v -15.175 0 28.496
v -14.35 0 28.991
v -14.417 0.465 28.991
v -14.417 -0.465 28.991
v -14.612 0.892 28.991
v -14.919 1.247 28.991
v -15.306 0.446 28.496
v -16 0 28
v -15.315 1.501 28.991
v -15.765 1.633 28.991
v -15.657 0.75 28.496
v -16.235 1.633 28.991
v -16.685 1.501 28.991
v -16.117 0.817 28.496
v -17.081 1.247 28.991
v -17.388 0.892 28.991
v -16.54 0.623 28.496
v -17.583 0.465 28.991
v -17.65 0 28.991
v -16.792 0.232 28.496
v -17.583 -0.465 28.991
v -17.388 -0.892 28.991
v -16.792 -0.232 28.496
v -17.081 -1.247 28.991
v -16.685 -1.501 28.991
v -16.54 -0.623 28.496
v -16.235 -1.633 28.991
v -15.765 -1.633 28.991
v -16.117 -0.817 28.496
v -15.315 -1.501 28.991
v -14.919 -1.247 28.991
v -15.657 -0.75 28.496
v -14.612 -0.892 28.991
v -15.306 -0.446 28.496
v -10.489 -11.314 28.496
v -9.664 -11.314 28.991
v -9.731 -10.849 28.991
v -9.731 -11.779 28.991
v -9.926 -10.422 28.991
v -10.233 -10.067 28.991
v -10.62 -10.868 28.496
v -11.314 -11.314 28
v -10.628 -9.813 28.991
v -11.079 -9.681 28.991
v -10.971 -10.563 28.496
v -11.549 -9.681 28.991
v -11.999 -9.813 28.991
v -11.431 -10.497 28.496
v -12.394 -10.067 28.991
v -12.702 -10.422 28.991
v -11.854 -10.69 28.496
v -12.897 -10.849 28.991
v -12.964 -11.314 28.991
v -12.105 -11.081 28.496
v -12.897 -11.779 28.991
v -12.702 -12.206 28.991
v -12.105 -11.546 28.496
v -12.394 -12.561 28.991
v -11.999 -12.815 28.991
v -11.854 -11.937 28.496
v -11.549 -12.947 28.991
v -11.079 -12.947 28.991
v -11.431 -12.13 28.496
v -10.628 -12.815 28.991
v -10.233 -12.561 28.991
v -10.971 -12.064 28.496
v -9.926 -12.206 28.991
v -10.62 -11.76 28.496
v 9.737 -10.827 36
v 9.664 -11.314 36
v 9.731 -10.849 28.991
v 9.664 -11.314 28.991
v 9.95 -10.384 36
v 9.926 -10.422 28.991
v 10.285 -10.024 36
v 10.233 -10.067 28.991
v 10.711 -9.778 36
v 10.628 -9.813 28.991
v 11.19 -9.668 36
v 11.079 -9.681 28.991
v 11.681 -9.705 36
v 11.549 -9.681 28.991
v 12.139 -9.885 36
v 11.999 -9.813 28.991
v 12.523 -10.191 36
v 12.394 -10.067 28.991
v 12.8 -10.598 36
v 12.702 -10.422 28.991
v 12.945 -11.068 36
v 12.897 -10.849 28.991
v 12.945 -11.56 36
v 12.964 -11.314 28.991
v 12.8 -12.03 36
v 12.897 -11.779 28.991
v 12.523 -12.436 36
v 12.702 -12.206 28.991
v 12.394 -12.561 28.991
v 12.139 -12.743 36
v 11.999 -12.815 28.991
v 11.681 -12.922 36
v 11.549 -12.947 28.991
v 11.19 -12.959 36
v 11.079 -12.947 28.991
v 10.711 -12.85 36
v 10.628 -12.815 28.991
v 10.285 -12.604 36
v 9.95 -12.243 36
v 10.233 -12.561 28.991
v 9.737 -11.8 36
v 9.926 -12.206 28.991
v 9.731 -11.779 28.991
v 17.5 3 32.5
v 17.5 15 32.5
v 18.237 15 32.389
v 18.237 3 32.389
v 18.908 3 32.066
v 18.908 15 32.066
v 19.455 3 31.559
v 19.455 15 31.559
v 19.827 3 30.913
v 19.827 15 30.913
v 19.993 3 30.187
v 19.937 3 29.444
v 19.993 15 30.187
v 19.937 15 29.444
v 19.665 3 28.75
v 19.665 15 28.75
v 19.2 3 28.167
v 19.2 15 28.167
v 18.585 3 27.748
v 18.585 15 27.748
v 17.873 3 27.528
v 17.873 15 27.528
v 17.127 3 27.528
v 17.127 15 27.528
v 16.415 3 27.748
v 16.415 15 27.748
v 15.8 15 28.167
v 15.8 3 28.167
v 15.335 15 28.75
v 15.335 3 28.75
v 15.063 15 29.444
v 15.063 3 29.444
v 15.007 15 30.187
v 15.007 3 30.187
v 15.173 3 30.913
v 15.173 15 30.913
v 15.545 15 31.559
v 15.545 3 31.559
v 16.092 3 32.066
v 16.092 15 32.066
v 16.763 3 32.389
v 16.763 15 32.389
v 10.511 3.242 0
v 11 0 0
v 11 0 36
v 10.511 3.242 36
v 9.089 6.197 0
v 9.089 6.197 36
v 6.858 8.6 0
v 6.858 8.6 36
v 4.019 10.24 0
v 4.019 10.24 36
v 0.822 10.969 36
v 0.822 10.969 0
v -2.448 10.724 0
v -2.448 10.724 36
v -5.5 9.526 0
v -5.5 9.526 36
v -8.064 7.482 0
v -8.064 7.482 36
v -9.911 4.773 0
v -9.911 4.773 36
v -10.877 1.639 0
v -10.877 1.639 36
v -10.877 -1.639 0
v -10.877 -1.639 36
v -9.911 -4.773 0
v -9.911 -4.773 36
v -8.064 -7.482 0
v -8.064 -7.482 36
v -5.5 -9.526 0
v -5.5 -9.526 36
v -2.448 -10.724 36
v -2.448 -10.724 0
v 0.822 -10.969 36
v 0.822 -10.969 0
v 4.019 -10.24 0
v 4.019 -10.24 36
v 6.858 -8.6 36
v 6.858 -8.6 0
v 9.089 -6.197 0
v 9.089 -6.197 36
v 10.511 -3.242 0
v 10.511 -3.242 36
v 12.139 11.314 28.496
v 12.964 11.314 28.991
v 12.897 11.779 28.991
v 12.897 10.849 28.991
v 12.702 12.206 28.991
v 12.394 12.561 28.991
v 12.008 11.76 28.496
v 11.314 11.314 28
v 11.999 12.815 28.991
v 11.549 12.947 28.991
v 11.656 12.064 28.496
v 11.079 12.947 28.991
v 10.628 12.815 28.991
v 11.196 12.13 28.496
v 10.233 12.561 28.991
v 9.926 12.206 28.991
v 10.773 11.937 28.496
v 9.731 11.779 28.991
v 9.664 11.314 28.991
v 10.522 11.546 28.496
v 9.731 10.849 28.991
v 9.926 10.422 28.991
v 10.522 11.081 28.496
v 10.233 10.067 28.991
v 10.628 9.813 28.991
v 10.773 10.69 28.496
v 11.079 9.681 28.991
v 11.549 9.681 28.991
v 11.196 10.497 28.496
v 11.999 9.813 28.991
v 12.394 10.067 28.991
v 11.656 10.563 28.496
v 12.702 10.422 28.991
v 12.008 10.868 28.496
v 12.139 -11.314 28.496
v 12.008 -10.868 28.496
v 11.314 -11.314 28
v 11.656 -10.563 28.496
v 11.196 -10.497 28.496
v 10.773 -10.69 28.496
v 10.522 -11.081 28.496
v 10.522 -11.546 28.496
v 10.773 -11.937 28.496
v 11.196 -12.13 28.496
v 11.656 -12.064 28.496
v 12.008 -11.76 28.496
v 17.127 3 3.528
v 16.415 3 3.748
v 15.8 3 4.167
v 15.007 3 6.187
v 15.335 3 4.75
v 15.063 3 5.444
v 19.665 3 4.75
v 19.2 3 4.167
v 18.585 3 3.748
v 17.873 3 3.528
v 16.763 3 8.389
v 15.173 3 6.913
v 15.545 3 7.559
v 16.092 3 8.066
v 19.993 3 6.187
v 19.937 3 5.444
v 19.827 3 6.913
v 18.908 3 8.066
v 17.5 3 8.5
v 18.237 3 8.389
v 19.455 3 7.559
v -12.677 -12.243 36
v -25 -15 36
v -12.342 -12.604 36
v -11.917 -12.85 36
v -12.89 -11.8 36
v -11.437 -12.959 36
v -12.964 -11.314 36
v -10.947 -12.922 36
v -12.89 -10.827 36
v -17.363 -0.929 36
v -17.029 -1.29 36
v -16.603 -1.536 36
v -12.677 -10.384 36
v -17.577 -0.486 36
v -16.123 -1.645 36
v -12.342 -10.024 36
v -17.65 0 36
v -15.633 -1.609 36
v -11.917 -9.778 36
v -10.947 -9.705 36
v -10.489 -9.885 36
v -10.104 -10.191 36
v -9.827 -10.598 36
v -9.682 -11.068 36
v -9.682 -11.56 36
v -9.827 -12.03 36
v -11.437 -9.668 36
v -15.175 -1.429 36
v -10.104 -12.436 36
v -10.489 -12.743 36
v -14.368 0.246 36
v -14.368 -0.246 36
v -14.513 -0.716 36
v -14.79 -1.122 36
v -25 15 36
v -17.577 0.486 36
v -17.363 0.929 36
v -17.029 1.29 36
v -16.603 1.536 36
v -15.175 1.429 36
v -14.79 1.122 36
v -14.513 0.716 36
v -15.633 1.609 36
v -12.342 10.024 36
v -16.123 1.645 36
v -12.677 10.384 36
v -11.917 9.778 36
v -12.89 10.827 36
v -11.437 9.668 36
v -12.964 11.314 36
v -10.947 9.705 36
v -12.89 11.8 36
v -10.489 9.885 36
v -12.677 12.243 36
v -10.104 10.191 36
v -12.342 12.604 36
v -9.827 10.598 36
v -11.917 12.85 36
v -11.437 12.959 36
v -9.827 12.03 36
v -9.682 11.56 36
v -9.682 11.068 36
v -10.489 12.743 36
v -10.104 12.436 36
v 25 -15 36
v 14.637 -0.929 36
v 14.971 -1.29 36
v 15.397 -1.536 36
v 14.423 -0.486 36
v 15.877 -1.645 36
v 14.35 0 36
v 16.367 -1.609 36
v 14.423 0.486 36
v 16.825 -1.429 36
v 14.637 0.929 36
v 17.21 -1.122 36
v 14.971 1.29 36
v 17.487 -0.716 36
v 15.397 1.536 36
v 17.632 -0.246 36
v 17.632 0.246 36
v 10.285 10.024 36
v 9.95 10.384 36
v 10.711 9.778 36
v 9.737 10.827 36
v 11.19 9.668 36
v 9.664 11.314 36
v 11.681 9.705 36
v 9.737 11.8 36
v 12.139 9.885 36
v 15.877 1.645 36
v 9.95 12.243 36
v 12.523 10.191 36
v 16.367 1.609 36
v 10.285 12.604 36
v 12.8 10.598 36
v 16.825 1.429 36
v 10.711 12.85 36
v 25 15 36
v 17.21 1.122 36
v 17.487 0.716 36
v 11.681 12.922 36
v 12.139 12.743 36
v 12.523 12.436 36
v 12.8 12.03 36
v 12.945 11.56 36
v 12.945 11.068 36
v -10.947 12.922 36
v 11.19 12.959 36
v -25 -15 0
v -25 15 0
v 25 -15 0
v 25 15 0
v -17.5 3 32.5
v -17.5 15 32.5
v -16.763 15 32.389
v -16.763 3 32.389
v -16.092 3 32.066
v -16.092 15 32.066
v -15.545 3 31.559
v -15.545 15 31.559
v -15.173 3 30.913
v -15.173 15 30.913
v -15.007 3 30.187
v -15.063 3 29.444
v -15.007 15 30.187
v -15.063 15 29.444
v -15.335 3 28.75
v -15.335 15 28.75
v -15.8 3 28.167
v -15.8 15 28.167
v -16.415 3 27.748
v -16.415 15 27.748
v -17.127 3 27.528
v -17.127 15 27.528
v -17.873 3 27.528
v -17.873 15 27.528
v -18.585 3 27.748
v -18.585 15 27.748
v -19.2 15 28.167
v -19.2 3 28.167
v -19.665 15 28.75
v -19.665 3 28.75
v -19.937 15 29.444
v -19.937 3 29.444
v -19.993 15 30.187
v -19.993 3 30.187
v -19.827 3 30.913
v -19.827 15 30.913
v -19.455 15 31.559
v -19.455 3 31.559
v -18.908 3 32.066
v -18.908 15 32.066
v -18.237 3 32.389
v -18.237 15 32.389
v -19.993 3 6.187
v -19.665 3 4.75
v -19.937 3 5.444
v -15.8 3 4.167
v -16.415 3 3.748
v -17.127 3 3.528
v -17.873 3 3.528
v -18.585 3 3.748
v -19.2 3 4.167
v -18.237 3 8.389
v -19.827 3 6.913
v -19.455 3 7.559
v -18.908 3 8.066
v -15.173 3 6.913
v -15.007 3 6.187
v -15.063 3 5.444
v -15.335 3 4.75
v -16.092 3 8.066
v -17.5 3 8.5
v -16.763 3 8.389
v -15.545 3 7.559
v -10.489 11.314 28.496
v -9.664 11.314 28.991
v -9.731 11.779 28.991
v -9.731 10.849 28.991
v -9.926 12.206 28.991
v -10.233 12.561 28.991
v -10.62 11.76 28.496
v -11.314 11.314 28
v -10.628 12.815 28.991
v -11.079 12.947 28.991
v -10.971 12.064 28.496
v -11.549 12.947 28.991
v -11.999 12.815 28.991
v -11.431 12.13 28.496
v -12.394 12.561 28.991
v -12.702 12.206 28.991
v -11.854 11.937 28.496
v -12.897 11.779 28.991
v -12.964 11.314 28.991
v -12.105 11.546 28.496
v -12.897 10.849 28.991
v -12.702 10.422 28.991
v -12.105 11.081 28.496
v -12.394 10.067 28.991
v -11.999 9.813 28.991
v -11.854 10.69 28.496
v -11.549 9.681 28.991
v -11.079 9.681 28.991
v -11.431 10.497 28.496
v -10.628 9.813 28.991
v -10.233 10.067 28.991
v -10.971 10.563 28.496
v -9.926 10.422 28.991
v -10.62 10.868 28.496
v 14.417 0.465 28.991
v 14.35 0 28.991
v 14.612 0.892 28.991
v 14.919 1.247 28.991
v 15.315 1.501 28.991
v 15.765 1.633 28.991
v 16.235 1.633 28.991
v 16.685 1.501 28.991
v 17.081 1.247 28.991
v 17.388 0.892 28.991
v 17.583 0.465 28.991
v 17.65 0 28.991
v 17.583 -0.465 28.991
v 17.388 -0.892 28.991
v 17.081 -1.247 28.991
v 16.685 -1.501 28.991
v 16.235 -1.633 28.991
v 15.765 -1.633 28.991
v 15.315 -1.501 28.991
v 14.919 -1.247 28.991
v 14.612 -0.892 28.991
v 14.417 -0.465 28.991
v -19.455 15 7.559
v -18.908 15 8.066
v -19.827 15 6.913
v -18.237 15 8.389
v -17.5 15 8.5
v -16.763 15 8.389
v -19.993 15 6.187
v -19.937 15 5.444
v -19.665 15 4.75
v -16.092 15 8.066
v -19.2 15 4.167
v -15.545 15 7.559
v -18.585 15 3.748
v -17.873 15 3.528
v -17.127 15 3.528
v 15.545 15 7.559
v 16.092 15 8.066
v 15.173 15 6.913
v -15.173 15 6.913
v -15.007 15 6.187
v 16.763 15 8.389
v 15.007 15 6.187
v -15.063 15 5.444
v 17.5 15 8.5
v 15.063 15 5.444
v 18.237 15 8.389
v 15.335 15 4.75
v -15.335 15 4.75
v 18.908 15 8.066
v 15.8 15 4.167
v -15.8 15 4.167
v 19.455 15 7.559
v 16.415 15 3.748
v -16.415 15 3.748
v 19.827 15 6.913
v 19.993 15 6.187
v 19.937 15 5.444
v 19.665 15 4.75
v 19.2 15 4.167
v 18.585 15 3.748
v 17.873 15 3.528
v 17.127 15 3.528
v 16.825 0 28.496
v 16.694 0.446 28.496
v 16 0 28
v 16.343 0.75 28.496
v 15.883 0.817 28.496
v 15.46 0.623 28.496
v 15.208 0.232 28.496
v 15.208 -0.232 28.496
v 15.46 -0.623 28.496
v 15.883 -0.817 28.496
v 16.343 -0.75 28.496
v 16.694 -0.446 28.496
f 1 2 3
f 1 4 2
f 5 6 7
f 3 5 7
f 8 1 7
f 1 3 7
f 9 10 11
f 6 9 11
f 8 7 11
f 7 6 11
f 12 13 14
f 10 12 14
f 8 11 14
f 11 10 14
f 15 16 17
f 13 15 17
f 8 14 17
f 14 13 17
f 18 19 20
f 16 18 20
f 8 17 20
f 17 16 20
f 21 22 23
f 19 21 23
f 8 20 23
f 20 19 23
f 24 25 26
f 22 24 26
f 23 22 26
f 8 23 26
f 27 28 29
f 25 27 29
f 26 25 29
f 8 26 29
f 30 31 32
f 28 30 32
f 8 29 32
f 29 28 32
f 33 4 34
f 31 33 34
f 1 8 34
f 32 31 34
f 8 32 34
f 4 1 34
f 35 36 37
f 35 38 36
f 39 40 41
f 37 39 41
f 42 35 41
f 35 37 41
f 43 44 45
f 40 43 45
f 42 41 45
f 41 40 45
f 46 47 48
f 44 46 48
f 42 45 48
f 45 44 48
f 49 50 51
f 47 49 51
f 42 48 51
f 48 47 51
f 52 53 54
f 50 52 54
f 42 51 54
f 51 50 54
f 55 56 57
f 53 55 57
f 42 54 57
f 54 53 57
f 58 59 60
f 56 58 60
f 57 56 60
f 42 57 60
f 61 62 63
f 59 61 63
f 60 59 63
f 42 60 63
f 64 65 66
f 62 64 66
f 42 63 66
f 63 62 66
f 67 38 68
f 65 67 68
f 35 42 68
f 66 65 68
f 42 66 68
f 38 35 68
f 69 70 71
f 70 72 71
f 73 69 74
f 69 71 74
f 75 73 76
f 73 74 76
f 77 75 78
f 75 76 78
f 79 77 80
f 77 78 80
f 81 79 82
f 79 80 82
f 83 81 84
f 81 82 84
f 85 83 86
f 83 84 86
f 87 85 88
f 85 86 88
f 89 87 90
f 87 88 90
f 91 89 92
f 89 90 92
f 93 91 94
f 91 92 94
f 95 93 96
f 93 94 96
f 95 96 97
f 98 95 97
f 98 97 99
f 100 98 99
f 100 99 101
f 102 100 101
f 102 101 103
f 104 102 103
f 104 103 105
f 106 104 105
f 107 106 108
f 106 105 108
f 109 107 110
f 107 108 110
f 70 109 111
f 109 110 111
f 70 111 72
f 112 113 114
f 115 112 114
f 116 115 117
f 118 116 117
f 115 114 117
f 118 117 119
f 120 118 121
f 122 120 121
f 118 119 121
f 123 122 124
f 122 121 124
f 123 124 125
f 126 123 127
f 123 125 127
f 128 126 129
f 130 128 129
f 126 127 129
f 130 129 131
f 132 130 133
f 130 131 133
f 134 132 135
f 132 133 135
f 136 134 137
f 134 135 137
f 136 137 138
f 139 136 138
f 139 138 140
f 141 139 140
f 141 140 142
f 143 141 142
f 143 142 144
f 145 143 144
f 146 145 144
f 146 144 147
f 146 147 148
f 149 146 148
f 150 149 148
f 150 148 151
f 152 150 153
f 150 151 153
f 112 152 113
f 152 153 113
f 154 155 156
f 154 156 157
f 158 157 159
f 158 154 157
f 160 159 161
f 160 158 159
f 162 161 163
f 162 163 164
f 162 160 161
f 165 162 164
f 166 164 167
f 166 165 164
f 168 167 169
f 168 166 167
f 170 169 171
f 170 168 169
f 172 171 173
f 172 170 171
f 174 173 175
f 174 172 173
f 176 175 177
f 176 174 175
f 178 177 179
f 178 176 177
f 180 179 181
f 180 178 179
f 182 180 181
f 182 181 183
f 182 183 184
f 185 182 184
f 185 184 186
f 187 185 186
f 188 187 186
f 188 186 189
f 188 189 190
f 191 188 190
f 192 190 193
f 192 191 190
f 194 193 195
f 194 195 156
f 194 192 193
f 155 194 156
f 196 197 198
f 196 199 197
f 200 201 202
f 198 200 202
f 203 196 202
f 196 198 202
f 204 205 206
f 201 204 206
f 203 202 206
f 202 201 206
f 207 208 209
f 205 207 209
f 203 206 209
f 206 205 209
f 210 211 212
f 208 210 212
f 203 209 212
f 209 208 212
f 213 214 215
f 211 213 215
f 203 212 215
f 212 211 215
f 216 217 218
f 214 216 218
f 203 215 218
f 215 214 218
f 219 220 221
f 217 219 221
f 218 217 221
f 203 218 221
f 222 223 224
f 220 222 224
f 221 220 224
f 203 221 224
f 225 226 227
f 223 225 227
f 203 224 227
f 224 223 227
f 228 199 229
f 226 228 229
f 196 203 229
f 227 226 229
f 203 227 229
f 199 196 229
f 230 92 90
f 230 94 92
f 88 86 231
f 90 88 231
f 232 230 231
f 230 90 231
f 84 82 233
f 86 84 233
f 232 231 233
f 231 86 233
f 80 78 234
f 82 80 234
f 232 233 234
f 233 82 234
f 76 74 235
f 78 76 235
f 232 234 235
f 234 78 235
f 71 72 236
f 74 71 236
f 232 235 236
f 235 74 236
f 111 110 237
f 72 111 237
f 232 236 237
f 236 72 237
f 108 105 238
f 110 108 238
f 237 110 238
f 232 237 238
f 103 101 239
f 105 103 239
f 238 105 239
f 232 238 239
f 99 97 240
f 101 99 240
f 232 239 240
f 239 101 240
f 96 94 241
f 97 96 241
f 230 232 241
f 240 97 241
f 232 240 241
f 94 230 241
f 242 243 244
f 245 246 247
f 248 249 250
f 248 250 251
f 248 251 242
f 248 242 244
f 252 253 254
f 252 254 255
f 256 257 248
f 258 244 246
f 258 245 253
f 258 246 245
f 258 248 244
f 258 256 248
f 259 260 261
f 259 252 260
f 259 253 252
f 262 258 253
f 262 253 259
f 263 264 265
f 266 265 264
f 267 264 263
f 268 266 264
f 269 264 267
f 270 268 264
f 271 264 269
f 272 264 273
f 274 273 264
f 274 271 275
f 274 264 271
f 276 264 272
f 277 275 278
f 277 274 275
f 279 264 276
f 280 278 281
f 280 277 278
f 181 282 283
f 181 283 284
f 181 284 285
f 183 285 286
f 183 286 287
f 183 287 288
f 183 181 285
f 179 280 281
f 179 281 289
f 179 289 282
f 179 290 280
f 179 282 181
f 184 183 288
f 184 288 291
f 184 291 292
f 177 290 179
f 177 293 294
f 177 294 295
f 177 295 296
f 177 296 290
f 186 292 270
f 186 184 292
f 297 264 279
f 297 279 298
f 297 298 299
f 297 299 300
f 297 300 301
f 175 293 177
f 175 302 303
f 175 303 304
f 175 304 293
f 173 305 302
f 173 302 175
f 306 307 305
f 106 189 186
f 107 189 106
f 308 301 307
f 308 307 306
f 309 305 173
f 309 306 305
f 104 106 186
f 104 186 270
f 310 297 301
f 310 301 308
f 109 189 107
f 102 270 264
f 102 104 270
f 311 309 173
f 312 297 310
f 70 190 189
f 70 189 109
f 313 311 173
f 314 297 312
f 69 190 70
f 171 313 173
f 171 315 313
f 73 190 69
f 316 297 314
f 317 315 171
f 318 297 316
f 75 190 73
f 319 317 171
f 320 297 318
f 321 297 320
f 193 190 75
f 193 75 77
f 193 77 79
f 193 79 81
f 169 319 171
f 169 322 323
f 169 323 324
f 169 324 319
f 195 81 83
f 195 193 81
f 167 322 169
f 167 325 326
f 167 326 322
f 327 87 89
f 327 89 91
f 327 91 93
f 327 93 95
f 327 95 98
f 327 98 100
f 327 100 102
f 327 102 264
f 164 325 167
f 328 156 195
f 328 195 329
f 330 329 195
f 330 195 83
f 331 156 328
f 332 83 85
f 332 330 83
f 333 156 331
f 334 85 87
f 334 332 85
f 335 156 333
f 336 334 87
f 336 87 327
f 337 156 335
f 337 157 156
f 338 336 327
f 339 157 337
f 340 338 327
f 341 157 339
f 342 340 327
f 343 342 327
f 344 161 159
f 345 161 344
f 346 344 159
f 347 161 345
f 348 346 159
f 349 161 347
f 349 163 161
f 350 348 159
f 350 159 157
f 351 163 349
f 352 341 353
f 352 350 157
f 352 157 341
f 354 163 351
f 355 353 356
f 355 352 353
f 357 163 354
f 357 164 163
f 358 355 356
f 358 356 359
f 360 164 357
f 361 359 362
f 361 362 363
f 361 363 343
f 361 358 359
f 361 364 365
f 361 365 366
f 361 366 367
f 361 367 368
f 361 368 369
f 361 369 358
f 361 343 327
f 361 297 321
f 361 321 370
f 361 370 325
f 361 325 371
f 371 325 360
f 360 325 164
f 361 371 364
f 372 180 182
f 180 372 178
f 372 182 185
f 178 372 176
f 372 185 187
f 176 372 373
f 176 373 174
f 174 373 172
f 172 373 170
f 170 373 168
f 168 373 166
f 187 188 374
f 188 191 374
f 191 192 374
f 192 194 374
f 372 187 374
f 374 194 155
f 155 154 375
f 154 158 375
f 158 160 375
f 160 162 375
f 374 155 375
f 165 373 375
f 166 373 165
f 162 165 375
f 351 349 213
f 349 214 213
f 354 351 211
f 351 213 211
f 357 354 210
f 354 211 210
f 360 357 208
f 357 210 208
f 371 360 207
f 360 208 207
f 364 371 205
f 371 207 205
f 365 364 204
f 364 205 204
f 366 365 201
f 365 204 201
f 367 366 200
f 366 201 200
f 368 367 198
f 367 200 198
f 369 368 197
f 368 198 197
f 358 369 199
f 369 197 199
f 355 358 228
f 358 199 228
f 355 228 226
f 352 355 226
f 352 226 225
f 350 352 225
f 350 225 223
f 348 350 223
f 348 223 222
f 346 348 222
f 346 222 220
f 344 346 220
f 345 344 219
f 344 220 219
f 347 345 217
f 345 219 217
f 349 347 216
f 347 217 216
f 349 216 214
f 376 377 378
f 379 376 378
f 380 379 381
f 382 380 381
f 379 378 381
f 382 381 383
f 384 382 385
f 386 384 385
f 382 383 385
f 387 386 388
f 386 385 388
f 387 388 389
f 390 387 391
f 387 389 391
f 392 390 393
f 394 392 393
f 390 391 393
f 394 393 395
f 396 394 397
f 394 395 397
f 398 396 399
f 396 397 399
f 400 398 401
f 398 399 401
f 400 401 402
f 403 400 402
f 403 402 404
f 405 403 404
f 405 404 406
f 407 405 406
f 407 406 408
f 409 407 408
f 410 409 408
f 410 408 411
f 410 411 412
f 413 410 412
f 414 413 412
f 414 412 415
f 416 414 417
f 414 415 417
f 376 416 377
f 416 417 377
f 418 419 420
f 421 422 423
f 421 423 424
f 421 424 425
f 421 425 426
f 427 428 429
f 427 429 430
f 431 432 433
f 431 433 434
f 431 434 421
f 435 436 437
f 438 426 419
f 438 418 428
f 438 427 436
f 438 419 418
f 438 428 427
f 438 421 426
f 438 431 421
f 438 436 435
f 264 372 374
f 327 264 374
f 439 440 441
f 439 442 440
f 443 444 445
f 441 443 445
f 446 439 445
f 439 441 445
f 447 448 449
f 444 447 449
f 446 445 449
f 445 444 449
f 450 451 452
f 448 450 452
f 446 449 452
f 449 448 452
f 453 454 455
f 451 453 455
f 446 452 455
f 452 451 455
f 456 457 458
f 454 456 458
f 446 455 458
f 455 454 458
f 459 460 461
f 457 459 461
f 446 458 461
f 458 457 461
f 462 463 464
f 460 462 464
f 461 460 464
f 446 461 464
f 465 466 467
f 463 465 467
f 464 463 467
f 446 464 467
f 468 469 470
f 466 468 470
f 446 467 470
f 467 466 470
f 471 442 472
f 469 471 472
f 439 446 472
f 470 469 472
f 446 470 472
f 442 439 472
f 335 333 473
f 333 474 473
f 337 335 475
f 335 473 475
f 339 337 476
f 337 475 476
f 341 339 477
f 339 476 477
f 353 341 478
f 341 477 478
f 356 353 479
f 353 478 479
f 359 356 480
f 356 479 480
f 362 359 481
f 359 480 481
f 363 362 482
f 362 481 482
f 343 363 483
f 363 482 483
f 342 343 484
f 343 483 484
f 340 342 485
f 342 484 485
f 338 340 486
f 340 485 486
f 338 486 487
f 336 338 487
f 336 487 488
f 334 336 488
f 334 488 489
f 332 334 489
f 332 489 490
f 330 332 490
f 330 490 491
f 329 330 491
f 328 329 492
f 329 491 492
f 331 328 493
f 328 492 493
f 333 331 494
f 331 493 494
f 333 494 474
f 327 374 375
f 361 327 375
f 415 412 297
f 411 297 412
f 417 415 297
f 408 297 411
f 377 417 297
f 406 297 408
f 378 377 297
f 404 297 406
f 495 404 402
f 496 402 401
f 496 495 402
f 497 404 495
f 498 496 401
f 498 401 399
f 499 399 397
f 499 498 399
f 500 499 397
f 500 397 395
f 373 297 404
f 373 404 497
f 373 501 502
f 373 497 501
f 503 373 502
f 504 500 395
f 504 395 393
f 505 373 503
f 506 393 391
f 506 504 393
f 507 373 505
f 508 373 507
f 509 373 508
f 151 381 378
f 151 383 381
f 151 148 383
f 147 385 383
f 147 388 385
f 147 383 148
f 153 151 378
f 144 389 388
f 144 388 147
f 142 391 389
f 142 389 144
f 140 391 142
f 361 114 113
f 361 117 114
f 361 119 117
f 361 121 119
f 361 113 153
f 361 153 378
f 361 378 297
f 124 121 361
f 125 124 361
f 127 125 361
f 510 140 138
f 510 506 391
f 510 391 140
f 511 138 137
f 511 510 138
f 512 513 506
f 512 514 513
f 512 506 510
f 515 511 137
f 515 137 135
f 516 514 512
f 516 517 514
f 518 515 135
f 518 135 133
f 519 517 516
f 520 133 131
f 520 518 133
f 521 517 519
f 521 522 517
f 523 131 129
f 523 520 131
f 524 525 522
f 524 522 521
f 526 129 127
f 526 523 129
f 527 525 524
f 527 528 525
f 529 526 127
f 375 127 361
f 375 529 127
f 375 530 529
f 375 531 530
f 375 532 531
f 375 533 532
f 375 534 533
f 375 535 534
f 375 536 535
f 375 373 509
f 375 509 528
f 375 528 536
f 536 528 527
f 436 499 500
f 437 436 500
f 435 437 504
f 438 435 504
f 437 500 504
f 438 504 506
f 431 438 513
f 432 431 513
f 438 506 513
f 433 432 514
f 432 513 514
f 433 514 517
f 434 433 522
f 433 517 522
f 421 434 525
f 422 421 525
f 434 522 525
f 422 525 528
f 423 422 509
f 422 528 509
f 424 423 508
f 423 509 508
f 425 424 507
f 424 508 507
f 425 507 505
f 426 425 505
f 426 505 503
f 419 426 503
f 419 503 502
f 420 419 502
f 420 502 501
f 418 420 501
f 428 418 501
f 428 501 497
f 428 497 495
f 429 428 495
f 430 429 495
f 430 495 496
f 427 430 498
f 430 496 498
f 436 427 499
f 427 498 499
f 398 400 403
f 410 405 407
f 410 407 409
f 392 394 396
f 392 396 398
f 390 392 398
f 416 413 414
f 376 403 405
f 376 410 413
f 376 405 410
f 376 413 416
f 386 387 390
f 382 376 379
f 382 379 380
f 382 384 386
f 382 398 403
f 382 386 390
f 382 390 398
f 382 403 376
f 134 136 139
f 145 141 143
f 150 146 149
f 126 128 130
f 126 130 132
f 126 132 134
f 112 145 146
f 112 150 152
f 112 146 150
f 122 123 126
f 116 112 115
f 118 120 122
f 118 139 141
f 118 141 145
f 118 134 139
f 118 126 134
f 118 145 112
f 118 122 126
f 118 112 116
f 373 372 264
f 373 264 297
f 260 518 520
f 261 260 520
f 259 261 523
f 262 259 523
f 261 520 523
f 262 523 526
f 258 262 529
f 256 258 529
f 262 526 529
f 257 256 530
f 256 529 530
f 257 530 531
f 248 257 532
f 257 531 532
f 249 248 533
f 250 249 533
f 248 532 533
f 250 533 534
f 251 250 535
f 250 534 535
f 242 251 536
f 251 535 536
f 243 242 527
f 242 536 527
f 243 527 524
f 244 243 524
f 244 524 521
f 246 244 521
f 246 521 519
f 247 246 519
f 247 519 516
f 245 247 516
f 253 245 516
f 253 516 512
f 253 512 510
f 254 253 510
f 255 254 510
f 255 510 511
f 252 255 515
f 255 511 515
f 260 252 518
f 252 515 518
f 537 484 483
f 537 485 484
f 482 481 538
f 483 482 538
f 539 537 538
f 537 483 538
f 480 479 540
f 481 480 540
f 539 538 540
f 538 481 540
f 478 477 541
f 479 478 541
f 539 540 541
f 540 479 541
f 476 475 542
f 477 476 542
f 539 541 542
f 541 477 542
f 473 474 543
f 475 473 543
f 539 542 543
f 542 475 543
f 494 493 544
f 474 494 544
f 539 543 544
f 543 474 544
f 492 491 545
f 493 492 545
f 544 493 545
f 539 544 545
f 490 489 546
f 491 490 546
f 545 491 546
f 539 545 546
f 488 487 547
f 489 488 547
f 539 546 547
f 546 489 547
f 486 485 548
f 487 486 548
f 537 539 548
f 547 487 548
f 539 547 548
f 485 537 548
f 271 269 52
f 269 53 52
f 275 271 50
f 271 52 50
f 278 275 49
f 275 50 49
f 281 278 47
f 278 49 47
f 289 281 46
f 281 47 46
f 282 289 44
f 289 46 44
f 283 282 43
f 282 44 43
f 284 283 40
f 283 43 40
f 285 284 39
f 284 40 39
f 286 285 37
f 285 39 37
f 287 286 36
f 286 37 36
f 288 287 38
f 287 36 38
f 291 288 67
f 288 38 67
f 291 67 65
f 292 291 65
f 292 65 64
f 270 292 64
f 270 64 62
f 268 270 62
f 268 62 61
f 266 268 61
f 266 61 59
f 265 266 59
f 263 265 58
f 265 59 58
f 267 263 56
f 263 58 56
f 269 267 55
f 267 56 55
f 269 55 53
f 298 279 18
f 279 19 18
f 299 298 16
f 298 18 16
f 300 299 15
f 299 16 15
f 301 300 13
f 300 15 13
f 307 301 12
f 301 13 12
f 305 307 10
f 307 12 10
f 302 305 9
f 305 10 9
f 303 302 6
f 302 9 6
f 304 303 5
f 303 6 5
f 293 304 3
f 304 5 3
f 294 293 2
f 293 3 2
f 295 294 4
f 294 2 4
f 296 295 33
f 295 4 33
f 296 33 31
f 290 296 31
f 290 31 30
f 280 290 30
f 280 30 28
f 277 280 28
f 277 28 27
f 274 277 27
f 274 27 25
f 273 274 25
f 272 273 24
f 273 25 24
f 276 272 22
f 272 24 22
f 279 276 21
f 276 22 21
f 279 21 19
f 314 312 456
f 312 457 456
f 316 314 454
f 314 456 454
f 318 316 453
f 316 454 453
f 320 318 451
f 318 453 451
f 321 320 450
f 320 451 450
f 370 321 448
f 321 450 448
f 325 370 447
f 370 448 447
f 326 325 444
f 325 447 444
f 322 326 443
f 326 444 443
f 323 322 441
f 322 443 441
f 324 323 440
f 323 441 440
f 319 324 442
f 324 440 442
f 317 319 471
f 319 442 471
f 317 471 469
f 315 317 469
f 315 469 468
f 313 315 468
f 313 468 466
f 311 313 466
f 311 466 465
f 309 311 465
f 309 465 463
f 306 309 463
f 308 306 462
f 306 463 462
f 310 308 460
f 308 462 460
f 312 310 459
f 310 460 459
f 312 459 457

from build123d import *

# Parameters (mm, degrees)
SKETCH2_W                   = 50
SKETCH2_H                   = 30
SKETCH2_R                   = 11
BOSS_EXTRUDE1_DEPTH         = 36
TAP_DRILL_FOR_M4_TAP1_D     = 3.3
TAP_DRILL_FOR_M4_TAP1_DEPTH = 7.008579979
TAP_DRILL_FOR_M4_TAP1_TIP   = 0.991420021
SKETCH5_R                   = 2.5
CUT_EXTRUDE1_DEPTH          = 12


with BuildPart() as part:
    # Sketch2 → Boss-Extrude1 (new body)
    with BuildSketch(Plane.XY):
        Rectangle(SKETCH2_W, SKETCH2_H)
        Circle(SKETCH2_R, mode=Mode.SUBTRACT)
    extrude(amount=BOSS_EXTRUDE1_DEPTH)

    # Tap Drill for M4 Tap1
    with Locations(Plane.XY.offset(36)):
        with Locations((11.313708499, 11.313708499), (-16, 0), (-11.313708499, 11.313708499), (-11.313708499, -11.313708499), (11.313708499, -11.313708499), (16, 0)):
            Hole(TAP_DRILL_FOR_M4_TAP1_D / 2, depth=TAP_DRILL_FOR_M4_TAP1_DEPTH)
            with Locations((0, 0, -(TAP_DRILL_FOR_M4_TAP1_DEPTH + TAP_DRILL_FOR_M4_TAP1_TIP / 2))):  # 118° drill point
                Cone(0, TAP_DRILL_FOR_M4_TAP1_D / 2, TAP_DRILL_FOR_M4_TAP1_TIP, mode=Mode.SUBTRACT)

    # Sketch5 → Cut-Extrude1 (cut)
    with BuildSketch(Plane(origin=(0, 15, 0), x_dir=(1, 0, 0), z_dir=(0, 1, 0))):
        with Locations(Location((-17.5, -6, 0), (0, 0, 270))):
            Circle(SKETCH5_R)
        with Locations(Location((17.5, -6, 0), (0, 0, 270))):
            Circle(SKETCH5_R)
        with Locations(Location((17.5, -30, 0), (0, 0, 270))):
            Circle(SKETCH5_R)
        with Locations(Location((-17.5, -30, 0), (0, 0, 270))):
            Circle(SKETCH5_R)
    extrude(amount=-CUT_EXTRUDE1_DEPTH, mode=Mode.SUBTRACT)


solid = part.part
